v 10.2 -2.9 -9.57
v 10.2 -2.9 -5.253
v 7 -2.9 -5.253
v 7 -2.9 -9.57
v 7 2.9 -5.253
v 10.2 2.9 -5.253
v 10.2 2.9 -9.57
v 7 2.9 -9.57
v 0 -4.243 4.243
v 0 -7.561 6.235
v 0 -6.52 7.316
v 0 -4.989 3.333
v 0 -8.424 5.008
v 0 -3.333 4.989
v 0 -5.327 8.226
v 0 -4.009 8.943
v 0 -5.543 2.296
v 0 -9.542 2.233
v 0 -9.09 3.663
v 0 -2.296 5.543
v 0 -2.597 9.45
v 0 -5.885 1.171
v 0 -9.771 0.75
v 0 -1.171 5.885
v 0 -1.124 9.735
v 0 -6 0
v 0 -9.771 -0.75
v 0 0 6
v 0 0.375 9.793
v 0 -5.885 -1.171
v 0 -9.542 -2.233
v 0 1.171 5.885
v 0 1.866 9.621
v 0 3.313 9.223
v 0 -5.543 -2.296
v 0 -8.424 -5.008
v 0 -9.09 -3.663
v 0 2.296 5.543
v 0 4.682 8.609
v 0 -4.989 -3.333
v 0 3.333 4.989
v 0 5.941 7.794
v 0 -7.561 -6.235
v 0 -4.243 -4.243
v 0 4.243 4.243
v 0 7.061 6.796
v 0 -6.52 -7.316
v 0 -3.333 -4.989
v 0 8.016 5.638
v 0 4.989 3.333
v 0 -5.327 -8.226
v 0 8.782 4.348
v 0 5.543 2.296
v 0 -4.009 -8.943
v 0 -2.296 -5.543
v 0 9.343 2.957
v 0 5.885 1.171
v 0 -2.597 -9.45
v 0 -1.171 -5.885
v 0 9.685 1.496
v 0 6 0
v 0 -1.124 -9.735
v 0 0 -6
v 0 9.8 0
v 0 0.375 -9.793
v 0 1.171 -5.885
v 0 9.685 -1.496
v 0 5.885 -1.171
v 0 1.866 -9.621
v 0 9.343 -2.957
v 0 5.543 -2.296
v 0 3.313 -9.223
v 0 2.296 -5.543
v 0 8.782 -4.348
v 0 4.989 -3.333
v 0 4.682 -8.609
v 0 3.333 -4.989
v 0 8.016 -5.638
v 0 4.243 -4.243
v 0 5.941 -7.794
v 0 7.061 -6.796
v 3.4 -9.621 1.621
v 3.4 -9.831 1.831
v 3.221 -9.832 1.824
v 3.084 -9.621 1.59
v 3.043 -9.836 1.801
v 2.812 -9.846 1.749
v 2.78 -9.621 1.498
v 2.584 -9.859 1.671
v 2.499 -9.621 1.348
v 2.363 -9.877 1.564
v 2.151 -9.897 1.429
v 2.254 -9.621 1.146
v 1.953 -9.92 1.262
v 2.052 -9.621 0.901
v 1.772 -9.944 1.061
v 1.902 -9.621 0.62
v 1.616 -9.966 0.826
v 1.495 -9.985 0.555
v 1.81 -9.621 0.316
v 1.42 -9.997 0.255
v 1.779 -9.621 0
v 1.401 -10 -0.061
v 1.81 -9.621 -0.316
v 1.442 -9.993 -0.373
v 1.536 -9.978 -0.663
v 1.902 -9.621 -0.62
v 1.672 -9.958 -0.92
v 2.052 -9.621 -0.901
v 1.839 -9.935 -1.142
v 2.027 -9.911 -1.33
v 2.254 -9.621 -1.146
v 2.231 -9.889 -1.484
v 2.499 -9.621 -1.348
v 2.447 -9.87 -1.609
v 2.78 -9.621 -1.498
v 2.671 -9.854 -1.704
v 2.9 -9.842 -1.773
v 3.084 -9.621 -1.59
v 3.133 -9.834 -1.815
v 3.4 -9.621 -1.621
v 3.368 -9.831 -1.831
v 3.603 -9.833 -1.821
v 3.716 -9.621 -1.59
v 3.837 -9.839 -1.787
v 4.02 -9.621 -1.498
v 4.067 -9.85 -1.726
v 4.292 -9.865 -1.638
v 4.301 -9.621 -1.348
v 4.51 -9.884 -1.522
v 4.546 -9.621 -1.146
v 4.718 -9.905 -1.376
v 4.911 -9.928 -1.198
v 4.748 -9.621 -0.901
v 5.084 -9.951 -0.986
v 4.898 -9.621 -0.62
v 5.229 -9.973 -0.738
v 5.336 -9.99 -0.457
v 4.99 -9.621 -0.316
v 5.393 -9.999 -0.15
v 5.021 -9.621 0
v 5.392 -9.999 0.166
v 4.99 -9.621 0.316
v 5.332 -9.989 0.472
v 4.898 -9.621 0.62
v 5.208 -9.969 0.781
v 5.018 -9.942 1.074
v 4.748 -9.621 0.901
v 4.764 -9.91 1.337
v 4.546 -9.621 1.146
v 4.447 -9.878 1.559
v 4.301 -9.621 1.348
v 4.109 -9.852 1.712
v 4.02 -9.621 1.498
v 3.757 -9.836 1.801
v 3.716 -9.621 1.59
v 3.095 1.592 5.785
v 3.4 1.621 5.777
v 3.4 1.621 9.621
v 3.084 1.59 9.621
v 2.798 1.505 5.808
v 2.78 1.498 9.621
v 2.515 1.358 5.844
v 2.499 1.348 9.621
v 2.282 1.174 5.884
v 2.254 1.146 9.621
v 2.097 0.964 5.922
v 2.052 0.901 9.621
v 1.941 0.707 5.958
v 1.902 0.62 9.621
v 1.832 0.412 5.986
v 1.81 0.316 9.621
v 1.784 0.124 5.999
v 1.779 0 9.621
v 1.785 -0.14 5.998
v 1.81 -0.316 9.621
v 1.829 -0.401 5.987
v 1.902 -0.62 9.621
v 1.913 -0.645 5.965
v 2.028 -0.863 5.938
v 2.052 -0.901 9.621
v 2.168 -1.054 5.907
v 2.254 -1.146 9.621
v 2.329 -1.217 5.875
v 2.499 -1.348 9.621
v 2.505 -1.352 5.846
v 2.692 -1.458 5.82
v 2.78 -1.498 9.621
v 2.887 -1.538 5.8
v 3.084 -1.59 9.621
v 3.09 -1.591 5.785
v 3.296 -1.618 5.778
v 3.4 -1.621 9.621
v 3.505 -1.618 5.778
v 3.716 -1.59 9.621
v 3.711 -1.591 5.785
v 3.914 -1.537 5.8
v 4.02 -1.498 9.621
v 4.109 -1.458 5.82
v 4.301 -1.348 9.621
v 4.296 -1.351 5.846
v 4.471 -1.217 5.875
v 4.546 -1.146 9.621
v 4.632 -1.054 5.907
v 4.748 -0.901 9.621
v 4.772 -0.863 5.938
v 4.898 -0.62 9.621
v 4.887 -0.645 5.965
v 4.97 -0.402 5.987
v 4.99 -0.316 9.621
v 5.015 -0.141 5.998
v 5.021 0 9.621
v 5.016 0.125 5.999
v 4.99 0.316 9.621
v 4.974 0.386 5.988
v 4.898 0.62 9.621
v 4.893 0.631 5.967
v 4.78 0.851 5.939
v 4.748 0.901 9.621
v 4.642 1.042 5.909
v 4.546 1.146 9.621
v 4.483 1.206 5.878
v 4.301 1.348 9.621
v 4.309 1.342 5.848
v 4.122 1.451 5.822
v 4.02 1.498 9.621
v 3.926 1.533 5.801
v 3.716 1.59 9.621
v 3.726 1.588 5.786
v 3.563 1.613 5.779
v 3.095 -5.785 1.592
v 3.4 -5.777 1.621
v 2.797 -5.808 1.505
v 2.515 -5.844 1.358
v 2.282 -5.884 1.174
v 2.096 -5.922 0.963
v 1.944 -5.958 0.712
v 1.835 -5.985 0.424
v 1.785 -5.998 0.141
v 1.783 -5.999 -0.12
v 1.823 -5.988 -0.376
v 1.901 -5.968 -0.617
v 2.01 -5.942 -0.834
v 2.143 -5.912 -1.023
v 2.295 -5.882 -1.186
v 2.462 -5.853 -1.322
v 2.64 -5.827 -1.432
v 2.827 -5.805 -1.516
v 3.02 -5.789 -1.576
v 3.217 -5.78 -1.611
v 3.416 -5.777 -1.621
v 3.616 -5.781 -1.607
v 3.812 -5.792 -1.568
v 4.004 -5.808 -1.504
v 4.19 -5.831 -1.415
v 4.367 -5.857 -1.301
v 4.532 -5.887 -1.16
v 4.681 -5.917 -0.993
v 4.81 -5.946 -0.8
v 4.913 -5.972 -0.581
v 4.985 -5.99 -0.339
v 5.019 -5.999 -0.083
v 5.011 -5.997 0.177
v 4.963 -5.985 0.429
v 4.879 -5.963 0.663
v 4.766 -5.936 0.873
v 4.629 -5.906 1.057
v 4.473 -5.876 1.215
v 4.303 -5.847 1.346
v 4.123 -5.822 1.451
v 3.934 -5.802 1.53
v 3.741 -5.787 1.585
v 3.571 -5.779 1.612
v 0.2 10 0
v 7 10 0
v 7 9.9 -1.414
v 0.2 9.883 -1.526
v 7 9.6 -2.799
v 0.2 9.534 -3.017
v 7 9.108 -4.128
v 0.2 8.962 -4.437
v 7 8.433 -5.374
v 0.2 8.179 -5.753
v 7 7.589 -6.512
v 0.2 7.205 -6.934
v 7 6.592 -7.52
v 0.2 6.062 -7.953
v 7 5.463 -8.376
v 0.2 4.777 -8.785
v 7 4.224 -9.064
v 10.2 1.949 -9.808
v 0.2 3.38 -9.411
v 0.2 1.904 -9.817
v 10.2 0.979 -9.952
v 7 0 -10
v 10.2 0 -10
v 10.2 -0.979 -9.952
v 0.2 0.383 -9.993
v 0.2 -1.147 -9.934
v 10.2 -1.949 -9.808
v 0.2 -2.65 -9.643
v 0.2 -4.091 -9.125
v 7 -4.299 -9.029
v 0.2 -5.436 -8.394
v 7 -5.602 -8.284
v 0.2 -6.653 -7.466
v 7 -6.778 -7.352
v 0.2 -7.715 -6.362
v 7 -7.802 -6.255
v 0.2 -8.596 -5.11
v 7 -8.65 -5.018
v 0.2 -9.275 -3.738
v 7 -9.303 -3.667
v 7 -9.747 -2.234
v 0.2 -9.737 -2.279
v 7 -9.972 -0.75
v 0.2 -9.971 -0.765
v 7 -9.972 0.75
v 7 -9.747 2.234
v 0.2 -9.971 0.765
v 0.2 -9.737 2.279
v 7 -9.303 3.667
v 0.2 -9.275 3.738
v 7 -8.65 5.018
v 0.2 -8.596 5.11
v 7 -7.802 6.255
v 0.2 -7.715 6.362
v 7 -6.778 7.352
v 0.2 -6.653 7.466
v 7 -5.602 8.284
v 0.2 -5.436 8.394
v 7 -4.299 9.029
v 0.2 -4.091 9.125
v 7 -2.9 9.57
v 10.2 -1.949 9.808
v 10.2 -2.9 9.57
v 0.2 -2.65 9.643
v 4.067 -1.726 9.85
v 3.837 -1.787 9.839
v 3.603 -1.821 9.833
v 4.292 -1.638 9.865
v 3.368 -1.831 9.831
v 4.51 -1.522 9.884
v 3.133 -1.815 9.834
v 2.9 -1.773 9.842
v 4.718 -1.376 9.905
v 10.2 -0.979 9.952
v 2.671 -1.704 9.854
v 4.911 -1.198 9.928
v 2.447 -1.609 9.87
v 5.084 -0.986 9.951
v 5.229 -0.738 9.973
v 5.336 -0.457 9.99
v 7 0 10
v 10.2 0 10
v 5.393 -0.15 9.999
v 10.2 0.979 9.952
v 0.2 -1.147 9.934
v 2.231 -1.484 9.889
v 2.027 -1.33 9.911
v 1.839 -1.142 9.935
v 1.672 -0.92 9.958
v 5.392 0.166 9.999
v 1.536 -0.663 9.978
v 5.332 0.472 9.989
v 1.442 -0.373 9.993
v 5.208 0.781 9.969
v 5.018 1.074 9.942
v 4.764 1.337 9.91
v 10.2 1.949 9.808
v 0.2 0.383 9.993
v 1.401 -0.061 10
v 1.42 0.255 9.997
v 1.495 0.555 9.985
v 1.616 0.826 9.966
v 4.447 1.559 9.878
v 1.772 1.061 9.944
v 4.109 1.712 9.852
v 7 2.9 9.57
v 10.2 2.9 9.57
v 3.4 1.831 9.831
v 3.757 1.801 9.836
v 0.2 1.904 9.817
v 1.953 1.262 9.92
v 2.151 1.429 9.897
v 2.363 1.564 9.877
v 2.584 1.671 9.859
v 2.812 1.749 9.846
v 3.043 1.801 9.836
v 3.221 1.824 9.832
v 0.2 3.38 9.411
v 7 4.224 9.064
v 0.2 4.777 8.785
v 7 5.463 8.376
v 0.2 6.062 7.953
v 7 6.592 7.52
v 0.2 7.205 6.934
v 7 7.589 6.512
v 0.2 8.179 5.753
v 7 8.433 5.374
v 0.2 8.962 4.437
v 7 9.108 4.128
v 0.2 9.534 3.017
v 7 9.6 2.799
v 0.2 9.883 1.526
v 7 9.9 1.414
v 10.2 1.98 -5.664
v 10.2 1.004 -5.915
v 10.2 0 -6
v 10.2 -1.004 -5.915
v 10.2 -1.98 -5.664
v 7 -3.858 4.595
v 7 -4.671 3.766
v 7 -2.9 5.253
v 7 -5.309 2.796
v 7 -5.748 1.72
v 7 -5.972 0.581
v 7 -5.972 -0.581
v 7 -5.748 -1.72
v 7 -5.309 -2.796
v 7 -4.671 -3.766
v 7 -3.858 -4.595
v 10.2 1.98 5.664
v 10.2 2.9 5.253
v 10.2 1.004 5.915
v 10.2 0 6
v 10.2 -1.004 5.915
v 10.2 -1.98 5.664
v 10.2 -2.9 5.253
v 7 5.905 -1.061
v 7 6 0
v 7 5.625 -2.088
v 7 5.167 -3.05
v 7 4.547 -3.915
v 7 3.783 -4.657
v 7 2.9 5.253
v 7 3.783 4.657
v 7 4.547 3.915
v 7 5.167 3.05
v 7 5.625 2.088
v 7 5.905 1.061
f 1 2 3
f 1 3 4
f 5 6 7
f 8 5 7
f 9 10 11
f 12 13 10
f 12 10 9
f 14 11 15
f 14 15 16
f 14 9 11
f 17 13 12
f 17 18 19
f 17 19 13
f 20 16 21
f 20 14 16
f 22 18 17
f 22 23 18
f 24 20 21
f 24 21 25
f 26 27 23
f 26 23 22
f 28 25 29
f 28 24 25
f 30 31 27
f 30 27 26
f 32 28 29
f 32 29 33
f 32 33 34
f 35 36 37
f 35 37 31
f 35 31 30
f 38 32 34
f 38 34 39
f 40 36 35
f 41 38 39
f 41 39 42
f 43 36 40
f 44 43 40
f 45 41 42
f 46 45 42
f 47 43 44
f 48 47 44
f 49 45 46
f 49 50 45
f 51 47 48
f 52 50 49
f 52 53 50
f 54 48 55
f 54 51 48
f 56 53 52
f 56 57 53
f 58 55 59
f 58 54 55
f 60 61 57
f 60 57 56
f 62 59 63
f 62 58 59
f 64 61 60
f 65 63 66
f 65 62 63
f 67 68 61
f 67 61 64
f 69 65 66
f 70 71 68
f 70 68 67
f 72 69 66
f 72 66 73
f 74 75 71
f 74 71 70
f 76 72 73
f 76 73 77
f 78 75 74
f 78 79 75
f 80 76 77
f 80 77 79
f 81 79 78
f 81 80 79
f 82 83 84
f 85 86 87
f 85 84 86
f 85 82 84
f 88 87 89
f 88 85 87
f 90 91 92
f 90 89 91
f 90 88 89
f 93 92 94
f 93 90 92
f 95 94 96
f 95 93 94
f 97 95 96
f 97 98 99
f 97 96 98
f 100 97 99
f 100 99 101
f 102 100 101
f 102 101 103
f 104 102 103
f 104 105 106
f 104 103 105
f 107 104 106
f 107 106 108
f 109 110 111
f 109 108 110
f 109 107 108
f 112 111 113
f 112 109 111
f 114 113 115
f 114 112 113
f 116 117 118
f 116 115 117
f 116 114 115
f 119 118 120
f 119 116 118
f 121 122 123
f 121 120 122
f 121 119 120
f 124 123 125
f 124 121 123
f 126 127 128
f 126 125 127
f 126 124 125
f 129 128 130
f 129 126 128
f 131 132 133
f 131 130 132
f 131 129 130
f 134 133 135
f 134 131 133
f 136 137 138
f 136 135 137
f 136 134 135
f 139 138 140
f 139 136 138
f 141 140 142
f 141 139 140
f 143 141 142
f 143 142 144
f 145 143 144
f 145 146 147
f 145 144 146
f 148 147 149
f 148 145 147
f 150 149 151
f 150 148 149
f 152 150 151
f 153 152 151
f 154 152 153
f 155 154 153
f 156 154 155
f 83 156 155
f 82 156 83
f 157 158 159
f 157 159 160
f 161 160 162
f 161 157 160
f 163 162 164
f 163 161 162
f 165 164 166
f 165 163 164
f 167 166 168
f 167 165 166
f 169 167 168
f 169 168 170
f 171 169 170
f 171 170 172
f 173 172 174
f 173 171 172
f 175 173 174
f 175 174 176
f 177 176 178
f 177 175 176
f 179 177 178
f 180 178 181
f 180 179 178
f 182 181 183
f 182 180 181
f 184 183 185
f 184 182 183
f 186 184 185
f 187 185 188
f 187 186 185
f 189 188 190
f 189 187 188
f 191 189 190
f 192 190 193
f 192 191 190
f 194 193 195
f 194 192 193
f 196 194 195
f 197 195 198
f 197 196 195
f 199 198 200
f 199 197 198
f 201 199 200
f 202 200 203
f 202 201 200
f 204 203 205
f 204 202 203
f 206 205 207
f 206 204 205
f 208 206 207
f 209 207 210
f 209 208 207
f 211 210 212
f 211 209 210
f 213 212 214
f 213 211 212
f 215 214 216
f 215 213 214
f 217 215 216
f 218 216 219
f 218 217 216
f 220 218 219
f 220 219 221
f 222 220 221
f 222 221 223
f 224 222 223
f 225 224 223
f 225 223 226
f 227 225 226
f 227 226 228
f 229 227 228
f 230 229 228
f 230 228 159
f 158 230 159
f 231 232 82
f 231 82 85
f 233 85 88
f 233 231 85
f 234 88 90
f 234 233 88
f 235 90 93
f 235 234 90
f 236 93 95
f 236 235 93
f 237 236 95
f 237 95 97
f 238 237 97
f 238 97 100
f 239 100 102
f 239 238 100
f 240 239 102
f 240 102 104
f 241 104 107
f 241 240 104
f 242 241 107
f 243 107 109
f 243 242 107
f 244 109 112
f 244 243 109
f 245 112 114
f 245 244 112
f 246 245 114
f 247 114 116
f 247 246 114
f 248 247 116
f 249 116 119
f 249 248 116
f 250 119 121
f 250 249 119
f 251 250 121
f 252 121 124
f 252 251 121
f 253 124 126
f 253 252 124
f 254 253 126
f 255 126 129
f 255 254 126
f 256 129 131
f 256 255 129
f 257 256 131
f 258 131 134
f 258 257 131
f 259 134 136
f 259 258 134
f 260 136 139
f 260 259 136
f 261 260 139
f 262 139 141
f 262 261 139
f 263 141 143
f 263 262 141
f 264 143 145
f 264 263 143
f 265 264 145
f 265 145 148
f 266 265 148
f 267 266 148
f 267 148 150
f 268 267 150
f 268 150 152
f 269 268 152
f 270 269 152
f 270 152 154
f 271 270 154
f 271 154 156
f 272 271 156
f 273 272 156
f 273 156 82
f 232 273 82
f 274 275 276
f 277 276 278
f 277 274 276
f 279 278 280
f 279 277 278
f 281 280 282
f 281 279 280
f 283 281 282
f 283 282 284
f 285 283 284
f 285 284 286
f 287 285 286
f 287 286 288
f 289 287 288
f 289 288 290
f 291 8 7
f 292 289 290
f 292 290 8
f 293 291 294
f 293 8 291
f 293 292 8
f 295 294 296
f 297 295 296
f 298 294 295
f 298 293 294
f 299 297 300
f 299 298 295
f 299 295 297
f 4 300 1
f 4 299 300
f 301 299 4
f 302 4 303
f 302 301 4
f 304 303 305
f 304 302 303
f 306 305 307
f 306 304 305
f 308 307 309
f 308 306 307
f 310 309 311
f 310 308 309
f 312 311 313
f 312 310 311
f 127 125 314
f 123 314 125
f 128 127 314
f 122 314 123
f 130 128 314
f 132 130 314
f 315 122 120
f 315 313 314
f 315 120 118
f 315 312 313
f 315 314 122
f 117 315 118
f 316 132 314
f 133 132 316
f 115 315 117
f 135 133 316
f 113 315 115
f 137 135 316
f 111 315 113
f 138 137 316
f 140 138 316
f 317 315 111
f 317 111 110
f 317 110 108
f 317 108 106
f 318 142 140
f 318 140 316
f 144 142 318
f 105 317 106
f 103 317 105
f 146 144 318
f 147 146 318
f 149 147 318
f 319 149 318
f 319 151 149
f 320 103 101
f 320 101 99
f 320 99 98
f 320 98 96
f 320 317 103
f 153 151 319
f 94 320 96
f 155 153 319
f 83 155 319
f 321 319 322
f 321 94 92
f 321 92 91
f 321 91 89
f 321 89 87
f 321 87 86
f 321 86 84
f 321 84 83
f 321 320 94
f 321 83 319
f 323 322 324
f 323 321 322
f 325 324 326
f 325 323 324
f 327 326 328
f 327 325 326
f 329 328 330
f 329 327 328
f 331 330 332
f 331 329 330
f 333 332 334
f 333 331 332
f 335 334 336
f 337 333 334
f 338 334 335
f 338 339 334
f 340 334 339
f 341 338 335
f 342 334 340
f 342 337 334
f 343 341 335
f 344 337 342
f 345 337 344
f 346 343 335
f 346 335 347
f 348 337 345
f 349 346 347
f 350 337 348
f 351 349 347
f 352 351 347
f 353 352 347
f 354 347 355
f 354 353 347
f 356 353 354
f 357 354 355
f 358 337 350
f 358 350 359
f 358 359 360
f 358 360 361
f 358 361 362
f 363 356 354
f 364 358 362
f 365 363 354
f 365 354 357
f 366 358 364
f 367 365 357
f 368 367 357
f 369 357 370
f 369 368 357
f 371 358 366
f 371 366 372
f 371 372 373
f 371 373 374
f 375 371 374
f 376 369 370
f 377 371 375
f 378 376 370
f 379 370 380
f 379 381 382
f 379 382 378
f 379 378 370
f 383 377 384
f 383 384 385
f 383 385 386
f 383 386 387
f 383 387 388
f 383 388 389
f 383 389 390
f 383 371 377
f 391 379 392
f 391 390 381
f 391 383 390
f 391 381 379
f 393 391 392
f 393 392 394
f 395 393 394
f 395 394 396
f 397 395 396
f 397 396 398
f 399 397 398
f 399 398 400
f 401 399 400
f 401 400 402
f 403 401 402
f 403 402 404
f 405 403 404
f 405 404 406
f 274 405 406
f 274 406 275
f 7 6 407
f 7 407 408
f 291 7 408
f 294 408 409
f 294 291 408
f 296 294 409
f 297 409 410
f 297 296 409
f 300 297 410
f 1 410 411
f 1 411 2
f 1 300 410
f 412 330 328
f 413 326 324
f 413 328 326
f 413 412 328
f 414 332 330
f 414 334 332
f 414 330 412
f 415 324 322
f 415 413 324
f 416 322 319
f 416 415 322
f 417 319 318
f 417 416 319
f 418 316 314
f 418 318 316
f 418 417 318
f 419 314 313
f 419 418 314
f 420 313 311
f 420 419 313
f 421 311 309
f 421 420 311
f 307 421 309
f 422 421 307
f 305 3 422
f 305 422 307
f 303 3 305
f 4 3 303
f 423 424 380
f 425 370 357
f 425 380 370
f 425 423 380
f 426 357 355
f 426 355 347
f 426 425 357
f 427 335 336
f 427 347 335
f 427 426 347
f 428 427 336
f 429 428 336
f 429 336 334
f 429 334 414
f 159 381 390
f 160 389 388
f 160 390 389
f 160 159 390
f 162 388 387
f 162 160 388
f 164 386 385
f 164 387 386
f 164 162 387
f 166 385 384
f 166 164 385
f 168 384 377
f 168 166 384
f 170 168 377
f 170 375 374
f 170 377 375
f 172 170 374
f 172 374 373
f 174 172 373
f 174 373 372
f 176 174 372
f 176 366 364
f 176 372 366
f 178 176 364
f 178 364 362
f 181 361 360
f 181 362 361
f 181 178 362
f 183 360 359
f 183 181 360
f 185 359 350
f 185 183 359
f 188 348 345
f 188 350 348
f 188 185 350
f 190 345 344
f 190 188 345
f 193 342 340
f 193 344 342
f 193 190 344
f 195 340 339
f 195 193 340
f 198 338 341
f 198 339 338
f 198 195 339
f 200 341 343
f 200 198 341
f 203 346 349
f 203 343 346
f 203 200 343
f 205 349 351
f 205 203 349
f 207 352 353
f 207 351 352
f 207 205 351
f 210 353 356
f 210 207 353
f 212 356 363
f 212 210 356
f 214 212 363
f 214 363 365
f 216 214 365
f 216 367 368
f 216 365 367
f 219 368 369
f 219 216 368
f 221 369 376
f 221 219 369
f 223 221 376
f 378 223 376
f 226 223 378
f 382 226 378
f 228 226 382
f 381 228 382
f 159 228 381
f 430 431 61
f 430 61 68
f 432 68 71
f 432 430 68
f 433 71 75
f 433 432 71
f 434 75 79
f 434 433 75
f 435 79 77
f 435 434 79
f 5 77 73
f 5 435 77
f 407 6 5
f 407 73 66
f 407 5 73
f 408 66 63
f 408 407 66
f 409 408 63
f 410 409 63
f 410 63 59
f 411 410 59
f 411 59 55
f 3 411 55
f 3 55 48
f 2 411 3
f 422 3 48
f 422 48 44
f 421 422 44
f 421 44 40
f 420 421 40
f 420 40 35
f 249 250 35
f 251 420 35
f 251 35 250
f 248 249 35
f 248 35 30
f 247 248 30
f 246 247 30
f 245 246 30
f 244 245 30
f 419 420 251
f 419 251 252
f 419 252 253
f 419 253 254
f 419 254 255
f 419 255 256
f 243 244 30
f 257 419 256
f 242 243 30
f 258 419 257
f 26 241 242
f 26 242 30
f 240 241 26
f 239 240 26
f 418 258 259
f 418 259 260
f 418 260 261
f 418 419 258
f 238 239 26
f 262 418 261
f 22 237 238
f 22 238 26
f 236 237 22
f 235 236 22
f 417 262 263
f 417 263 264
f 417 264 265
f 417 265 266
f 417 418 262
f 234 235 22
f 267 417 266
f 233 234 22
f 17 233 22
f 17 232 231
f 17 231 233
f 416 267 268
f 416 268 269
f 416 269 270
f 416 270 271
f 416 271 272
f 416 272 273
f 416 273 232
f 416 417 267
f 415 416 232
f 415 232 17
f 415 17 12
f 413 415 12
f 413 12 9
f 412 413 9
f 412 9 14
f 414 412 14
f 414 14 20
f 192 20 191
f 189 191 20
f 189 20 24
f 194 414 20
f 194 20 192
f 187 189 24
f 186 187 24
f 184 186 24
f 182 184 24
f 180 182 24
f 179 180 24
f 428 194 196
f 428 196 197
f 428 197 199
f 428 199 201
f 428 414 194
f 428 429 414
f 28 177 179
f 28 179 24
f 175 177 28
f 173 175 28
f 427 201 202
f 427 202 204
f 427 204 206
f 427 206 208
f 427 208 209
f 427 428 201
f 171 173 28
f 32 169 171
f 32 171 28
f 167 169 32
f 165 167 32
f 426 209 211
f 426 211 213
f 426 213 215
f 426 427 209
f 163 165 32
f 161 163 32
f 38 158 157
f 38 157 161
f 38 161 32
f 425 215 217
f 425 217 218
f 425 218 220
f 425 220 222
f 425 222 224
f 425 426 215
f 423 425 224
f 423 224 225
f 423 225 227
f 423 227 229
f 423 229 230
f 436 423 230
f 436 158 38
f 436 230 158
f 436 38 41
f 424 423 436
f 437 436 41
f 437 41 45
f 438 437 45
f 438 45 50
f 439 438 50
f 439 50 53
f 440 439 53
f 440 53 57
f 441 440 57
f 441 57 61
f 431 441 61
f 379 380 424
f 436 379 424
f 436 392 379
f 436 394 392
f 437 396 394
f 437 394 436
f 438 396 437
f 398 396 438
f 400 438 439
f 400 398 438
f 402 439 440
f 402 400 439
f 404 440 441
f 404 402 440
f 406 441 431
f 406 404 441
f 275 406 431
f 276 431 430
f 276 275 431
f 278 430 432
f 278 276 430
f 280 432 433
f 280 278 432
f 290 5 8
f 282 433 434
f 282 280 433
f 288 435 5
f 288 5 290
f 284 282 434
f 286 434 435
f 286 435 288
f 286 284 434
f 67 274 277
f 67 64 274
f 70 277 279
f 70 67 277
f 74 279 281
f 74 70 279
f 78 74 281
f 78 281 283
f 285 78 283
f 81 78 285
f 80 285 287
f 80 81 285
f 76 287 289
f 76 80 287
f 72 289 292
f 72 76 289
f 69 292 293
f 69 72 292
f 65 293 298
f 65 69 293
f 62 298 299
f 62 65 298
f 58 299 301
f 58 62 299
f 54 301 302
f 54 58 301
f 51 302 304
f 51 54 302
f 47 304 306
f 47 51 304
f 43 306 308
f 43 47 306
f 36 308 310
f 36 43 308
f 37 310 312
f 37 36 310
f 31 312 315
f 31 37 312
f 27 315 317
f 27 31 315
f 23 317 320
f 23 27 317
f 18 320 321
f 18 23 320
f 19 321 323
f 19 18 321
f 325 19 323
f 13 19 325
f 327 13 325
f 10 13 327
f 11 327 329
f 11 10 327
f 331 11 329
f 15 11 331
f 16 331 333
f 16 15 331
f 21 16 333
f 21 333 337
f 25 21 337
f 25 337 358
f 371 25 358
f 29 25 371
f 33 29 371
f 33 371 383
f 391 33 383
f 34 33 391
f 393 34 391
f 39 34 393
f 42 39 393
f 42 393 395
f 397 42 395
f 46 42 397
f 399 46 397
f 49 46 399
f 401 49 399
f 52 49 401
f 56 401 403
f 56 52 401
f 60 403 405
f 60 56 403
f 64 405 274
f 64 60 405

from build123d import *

# Parameters (mm, degrees)
SKETCH2_W          = 22
SKETCH2_H          = 21
SKETCH2_W_2        = 20
SKETCH2_H_2        = 5.8
CUT_EXTRUDE1_DEPTH = 3.2


with BuildPart() as part:
    # Sketch1 → Revolve1 (revolve)
    with BuildSketch(Plane.XY):
        Polygon((0, 9.8), (0, 6), (10.2, 6), (10.2, 10), (0.2, 10), align=None)
    revolve(axis=Axis((10.2, 0, 0), (-1, 0, 0)))

    # Sketch2 → Cut-Extrude1 (cut)
    with BuildSketch(Plane(origin=(10.2, 0, 0), x_dir=(0, 0, -1), z_dir=(1, 0, 0))):
        Rectangle(SKETCH2_W, SKETCH2_H)
        Rectangle(SKETCH2_W_2, SKETCH2_H_2, mode=Mode.SUBTRACT)
    extrude(amount=-CUT_EXTRUDE1_DEPTH, mode=Mode.SUBTRACT)

    # Sketch3 → Cut-Revolve1 (revolve, cut)
    with BuildSketch(Plane(origin=(3.4, 0, 0), x_dir=(0, 0, -1), z_dir=(1, 0, 0))):
        Polygon((-10, 0), (-10, 2), (-9.621, 1.621), (0, 1.621), (0, 0), align=None)
    revolve(axis=Axis((3.4, 0, 0), (0, 0, 1)), mode=Mode.SUBTRACT)

    # Sketch4 → Cut-Revolve2 (revolve, cut)
    with BuildSketch(Plane(origin=(3.4, 0, 0), x_dir=(0, 0, -1), z_dir=(1, 0, 0))):
        Polygon((0, -10), (-2, -10), (-1.621, -9.621), (-1.621, 0), (0, 0), align=None)
    revolve(axis=Axis((3.4, 0, 0), (0, -1, 0)), mode=Mode.SUBTRACT)


solid = part.part
